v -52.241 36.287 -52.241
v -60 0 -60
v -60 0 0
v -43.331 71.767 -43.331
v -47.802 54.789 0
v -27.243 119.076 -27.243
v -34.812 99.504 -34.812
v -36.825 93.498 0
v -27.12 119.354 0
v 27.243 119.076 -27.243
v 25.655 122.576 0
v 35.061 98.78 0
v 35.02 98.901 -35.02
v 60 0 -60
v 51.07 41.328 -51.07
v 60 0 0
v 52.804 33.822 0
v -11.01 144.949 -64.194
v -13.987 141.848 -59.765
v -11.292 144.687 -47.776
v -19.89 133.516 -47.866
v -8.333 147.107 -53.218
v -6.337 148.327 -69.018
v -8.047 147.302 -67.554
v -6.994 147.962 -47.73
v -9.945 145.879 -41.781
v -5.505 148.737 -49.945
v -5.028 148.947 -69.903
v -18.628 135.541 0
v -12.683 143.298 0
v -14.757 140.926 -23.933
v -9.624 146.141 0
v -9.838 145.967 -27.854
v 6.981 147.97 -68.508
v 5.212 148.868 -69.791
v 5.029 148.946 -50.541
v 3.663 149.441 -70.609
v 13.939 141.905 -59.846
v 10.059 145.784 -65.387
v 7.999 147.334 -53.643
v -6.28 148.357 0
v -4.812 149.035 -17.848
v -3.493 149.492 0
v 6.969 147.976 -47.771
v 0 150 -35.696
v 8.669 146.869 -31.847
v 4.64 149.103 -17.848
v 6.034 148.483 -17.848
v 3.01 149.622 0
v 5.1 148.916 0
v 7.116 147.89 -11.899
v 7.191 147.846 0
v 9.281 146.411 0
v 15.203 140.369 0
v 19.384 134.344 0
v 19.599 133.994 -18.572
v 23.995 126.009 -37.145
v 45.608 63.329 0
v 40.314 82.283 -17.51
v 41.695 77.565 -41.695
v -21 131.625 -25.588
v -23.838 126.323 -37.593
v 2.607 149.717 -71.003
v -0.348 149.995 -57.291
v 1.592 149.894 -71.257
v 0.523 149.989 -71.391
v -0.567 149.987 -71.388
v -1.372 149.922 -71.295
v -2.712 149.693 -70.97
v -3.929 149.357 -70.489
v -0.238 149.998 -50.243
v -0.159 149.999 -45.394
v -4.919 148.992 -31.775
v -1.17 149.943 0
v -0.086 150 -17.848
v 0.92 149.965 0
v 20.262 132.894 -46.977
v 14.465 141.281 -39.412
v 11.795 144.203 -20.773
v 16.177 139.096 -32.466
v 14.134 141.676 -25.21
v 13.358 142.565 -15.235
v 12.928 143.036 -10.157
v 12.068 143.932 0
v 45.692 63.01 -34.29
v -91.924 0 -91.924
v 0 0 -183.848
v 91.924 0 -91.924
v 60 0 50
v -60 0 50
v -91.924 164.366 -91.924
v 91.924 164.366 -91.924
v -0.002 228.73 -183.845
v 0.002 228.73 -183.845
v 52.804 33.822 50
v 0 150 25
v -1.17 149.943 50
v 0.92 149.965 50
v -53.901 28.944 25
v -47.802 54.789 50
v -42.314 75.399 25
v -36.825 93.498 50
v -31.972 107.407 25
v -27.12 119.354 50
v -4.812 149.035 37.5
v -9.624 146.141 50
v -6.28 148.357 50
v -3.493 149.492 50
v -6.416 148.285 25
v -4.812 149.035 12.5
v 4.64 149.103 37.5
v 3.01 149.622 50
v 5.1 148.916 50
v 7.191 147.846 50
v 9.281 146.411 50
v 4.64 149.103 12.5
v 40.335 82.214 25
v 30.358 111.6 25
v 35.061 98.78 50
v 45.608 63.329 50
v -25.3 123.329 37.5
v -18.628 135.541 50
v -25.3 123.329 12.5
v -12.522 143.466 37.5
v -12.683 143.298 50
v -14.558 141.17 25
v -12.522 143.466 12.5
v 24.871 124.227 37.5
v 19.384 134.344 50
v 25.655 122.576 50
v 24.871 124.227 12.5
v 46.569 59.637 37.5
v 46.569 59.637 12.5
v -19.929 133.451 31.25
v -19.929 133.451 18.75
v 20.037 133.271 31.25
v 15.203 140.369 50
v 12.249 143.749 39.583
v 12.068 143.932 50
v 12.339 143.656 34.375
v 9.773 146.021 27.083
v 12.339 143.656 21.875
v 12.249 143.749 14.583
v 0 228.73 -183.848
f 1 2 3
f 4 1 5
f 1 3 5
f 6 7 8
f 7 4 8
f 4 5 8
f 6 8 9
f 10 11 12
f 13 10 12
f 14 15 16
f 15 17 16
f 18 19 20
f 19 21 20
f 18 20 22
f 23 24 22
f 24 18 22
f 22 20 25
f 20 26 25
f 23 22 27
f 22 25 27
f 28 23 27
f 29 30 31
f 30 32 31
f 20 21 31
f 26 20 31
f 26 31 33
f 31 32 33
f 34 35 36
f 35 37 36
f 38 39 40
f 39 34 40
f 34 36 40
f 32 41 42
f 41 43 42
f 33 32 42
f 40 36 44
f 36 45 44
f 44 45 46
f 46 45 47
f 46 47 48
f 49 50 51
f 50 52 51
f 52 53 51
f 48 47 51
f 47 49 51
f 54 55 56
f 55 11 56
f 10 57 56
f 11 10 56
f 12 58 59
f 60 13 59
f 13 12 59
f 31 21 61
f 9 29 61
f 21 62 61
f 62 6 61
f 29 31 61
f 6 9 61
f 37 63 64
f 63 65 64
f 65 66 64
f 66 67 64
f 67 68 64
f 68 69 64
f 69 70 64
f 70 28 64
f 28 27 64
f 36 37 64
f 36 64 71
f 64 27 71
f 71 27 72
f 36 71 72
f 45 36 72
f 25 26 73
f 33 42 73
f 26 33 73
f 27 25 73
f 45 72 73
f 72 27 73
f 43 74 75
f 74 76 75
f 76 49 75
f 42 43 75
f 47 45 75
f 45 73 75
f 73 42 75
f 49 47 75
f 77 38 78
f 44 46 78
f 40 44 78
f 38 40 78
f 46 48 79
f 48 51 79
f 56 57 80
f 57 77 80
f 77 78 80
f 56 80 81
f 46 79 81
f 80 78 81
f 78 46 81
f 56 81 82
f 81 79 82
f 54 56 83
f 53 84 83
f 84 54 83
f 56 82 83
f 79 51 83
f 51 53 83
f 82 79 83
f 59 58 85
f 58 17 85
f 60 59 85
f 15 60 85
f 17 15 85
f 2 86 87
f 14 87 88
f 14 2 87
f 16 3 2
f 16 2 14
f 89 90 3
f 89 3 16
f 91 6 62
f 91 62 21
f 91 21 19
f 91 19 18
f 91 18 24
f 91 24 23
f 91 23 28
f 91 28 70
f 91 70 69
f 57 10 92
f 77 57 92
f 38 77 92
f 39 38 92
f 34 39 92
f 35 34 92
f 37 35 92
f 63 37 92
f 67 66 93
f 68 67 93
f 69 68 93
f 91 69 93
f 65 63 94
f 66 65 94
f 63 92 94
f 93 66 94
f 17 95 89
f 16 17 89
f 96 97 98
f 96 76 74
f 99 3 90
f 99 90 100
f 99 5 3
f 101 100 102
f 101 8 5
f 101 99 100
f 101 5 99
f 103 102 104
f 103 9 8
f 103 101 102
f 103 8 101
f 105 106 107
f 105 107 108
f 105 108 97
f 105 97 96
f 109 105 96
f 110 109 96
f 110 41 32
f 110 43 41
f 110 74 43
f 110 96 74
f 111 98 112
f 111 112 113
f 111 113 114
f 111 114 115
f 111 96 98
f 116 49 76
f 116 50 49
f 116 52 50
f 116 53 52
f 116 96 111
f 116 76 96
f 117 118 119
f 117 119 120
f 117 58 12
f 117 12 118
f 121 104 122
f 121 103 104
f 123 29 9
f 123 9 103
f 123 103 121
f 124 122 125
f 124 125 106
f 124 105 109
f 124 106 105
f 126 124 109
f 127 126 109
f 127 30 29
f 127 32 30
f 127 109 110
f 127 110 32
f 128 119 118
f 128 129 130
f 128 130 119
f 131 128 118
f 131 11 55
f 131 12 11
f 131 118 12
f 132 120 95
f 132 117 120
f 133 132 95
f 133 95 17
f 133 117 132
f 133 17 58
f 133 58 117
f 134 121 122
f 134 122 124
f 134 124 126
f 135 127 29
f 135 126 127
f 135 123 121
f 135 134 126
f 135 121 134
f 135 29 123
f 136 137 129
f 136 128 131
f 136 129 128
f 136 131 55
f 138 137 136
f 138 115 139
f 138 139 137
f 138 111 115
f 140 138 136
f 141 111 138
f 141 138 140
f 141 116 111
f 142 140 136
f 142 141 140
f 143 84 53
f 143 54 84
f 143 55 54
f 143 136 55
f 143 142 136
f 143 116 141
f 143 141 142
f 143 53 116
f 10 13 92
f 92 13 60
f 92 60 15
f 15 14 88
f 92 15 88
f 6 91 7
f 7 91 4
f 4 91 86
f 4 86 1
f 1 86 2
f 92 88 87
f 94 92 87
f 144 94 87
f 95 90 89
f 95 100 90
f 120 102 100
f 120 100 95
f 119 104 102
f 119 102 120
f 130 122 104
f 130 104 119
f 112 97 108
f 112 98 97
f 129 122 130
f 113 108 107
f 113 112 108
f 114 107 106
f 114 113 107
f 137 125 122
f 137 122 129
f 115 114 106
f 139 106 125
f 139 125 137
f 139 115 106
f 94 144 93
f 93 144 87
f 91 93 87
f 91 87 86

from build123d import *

# Parameters (mm, degrees)
EXTRUDE1_DEPTH      = 228.73
CUT_EXTRUDE1_DEPTH  = 95
EXTRUDE2_DEPTH      = 50
EXTRUDE2_DEPTH_BACK = 100


with BuildPart() as part:
    # Sketch1 → Extrude1 (new body)
    with BuildSketch(Plane(origin=(0, 0, 0), x_dir=(1, 0, 0), z_dir=(0, 1, 0))):
        Polygon((0, 0), (91.923881554, 91.923881554), (0, 183.847763109), (-91.923881554, 91.923881554), align=None)
    extrude(amount=EXTRUDE1_DEPTH)

    # Sketch2 → Cut-Extrude1 (cut, symmetric)
    with BuildSketch(Plane(origin=(0, 0, 0), x_dir=(0, 0, -1), z_dir=(1, 0, 0))):
        Polygon((0, 100), (183.847763109, 228.731589612), (0, 228.731589612), align=None)
    extrude(amount=CUT_EXTRUDE1_DEPTH, both=True, mode=Mode.SUBTRACT)

    # Sketch3 → Extrude2 (add, two sides)
    with BuildSketch(Plane.XY) as extrude2_sk:
        with BuildLine():
            Line((-60, 0), (60, 0))
            add(Edge.make_bspline(
                [(-60, 0), (0, 300), (60, 0)],
                knots=[0, 0, 0, 1, 1, 1], degree=2))
        make_face()
    extrude(amount=EXTRUDE2_DEPTH)
    extrude(extrude2_sk.sketch, amount=-EXTRUDE2_DEPTH_BACK)


solid = part.part
